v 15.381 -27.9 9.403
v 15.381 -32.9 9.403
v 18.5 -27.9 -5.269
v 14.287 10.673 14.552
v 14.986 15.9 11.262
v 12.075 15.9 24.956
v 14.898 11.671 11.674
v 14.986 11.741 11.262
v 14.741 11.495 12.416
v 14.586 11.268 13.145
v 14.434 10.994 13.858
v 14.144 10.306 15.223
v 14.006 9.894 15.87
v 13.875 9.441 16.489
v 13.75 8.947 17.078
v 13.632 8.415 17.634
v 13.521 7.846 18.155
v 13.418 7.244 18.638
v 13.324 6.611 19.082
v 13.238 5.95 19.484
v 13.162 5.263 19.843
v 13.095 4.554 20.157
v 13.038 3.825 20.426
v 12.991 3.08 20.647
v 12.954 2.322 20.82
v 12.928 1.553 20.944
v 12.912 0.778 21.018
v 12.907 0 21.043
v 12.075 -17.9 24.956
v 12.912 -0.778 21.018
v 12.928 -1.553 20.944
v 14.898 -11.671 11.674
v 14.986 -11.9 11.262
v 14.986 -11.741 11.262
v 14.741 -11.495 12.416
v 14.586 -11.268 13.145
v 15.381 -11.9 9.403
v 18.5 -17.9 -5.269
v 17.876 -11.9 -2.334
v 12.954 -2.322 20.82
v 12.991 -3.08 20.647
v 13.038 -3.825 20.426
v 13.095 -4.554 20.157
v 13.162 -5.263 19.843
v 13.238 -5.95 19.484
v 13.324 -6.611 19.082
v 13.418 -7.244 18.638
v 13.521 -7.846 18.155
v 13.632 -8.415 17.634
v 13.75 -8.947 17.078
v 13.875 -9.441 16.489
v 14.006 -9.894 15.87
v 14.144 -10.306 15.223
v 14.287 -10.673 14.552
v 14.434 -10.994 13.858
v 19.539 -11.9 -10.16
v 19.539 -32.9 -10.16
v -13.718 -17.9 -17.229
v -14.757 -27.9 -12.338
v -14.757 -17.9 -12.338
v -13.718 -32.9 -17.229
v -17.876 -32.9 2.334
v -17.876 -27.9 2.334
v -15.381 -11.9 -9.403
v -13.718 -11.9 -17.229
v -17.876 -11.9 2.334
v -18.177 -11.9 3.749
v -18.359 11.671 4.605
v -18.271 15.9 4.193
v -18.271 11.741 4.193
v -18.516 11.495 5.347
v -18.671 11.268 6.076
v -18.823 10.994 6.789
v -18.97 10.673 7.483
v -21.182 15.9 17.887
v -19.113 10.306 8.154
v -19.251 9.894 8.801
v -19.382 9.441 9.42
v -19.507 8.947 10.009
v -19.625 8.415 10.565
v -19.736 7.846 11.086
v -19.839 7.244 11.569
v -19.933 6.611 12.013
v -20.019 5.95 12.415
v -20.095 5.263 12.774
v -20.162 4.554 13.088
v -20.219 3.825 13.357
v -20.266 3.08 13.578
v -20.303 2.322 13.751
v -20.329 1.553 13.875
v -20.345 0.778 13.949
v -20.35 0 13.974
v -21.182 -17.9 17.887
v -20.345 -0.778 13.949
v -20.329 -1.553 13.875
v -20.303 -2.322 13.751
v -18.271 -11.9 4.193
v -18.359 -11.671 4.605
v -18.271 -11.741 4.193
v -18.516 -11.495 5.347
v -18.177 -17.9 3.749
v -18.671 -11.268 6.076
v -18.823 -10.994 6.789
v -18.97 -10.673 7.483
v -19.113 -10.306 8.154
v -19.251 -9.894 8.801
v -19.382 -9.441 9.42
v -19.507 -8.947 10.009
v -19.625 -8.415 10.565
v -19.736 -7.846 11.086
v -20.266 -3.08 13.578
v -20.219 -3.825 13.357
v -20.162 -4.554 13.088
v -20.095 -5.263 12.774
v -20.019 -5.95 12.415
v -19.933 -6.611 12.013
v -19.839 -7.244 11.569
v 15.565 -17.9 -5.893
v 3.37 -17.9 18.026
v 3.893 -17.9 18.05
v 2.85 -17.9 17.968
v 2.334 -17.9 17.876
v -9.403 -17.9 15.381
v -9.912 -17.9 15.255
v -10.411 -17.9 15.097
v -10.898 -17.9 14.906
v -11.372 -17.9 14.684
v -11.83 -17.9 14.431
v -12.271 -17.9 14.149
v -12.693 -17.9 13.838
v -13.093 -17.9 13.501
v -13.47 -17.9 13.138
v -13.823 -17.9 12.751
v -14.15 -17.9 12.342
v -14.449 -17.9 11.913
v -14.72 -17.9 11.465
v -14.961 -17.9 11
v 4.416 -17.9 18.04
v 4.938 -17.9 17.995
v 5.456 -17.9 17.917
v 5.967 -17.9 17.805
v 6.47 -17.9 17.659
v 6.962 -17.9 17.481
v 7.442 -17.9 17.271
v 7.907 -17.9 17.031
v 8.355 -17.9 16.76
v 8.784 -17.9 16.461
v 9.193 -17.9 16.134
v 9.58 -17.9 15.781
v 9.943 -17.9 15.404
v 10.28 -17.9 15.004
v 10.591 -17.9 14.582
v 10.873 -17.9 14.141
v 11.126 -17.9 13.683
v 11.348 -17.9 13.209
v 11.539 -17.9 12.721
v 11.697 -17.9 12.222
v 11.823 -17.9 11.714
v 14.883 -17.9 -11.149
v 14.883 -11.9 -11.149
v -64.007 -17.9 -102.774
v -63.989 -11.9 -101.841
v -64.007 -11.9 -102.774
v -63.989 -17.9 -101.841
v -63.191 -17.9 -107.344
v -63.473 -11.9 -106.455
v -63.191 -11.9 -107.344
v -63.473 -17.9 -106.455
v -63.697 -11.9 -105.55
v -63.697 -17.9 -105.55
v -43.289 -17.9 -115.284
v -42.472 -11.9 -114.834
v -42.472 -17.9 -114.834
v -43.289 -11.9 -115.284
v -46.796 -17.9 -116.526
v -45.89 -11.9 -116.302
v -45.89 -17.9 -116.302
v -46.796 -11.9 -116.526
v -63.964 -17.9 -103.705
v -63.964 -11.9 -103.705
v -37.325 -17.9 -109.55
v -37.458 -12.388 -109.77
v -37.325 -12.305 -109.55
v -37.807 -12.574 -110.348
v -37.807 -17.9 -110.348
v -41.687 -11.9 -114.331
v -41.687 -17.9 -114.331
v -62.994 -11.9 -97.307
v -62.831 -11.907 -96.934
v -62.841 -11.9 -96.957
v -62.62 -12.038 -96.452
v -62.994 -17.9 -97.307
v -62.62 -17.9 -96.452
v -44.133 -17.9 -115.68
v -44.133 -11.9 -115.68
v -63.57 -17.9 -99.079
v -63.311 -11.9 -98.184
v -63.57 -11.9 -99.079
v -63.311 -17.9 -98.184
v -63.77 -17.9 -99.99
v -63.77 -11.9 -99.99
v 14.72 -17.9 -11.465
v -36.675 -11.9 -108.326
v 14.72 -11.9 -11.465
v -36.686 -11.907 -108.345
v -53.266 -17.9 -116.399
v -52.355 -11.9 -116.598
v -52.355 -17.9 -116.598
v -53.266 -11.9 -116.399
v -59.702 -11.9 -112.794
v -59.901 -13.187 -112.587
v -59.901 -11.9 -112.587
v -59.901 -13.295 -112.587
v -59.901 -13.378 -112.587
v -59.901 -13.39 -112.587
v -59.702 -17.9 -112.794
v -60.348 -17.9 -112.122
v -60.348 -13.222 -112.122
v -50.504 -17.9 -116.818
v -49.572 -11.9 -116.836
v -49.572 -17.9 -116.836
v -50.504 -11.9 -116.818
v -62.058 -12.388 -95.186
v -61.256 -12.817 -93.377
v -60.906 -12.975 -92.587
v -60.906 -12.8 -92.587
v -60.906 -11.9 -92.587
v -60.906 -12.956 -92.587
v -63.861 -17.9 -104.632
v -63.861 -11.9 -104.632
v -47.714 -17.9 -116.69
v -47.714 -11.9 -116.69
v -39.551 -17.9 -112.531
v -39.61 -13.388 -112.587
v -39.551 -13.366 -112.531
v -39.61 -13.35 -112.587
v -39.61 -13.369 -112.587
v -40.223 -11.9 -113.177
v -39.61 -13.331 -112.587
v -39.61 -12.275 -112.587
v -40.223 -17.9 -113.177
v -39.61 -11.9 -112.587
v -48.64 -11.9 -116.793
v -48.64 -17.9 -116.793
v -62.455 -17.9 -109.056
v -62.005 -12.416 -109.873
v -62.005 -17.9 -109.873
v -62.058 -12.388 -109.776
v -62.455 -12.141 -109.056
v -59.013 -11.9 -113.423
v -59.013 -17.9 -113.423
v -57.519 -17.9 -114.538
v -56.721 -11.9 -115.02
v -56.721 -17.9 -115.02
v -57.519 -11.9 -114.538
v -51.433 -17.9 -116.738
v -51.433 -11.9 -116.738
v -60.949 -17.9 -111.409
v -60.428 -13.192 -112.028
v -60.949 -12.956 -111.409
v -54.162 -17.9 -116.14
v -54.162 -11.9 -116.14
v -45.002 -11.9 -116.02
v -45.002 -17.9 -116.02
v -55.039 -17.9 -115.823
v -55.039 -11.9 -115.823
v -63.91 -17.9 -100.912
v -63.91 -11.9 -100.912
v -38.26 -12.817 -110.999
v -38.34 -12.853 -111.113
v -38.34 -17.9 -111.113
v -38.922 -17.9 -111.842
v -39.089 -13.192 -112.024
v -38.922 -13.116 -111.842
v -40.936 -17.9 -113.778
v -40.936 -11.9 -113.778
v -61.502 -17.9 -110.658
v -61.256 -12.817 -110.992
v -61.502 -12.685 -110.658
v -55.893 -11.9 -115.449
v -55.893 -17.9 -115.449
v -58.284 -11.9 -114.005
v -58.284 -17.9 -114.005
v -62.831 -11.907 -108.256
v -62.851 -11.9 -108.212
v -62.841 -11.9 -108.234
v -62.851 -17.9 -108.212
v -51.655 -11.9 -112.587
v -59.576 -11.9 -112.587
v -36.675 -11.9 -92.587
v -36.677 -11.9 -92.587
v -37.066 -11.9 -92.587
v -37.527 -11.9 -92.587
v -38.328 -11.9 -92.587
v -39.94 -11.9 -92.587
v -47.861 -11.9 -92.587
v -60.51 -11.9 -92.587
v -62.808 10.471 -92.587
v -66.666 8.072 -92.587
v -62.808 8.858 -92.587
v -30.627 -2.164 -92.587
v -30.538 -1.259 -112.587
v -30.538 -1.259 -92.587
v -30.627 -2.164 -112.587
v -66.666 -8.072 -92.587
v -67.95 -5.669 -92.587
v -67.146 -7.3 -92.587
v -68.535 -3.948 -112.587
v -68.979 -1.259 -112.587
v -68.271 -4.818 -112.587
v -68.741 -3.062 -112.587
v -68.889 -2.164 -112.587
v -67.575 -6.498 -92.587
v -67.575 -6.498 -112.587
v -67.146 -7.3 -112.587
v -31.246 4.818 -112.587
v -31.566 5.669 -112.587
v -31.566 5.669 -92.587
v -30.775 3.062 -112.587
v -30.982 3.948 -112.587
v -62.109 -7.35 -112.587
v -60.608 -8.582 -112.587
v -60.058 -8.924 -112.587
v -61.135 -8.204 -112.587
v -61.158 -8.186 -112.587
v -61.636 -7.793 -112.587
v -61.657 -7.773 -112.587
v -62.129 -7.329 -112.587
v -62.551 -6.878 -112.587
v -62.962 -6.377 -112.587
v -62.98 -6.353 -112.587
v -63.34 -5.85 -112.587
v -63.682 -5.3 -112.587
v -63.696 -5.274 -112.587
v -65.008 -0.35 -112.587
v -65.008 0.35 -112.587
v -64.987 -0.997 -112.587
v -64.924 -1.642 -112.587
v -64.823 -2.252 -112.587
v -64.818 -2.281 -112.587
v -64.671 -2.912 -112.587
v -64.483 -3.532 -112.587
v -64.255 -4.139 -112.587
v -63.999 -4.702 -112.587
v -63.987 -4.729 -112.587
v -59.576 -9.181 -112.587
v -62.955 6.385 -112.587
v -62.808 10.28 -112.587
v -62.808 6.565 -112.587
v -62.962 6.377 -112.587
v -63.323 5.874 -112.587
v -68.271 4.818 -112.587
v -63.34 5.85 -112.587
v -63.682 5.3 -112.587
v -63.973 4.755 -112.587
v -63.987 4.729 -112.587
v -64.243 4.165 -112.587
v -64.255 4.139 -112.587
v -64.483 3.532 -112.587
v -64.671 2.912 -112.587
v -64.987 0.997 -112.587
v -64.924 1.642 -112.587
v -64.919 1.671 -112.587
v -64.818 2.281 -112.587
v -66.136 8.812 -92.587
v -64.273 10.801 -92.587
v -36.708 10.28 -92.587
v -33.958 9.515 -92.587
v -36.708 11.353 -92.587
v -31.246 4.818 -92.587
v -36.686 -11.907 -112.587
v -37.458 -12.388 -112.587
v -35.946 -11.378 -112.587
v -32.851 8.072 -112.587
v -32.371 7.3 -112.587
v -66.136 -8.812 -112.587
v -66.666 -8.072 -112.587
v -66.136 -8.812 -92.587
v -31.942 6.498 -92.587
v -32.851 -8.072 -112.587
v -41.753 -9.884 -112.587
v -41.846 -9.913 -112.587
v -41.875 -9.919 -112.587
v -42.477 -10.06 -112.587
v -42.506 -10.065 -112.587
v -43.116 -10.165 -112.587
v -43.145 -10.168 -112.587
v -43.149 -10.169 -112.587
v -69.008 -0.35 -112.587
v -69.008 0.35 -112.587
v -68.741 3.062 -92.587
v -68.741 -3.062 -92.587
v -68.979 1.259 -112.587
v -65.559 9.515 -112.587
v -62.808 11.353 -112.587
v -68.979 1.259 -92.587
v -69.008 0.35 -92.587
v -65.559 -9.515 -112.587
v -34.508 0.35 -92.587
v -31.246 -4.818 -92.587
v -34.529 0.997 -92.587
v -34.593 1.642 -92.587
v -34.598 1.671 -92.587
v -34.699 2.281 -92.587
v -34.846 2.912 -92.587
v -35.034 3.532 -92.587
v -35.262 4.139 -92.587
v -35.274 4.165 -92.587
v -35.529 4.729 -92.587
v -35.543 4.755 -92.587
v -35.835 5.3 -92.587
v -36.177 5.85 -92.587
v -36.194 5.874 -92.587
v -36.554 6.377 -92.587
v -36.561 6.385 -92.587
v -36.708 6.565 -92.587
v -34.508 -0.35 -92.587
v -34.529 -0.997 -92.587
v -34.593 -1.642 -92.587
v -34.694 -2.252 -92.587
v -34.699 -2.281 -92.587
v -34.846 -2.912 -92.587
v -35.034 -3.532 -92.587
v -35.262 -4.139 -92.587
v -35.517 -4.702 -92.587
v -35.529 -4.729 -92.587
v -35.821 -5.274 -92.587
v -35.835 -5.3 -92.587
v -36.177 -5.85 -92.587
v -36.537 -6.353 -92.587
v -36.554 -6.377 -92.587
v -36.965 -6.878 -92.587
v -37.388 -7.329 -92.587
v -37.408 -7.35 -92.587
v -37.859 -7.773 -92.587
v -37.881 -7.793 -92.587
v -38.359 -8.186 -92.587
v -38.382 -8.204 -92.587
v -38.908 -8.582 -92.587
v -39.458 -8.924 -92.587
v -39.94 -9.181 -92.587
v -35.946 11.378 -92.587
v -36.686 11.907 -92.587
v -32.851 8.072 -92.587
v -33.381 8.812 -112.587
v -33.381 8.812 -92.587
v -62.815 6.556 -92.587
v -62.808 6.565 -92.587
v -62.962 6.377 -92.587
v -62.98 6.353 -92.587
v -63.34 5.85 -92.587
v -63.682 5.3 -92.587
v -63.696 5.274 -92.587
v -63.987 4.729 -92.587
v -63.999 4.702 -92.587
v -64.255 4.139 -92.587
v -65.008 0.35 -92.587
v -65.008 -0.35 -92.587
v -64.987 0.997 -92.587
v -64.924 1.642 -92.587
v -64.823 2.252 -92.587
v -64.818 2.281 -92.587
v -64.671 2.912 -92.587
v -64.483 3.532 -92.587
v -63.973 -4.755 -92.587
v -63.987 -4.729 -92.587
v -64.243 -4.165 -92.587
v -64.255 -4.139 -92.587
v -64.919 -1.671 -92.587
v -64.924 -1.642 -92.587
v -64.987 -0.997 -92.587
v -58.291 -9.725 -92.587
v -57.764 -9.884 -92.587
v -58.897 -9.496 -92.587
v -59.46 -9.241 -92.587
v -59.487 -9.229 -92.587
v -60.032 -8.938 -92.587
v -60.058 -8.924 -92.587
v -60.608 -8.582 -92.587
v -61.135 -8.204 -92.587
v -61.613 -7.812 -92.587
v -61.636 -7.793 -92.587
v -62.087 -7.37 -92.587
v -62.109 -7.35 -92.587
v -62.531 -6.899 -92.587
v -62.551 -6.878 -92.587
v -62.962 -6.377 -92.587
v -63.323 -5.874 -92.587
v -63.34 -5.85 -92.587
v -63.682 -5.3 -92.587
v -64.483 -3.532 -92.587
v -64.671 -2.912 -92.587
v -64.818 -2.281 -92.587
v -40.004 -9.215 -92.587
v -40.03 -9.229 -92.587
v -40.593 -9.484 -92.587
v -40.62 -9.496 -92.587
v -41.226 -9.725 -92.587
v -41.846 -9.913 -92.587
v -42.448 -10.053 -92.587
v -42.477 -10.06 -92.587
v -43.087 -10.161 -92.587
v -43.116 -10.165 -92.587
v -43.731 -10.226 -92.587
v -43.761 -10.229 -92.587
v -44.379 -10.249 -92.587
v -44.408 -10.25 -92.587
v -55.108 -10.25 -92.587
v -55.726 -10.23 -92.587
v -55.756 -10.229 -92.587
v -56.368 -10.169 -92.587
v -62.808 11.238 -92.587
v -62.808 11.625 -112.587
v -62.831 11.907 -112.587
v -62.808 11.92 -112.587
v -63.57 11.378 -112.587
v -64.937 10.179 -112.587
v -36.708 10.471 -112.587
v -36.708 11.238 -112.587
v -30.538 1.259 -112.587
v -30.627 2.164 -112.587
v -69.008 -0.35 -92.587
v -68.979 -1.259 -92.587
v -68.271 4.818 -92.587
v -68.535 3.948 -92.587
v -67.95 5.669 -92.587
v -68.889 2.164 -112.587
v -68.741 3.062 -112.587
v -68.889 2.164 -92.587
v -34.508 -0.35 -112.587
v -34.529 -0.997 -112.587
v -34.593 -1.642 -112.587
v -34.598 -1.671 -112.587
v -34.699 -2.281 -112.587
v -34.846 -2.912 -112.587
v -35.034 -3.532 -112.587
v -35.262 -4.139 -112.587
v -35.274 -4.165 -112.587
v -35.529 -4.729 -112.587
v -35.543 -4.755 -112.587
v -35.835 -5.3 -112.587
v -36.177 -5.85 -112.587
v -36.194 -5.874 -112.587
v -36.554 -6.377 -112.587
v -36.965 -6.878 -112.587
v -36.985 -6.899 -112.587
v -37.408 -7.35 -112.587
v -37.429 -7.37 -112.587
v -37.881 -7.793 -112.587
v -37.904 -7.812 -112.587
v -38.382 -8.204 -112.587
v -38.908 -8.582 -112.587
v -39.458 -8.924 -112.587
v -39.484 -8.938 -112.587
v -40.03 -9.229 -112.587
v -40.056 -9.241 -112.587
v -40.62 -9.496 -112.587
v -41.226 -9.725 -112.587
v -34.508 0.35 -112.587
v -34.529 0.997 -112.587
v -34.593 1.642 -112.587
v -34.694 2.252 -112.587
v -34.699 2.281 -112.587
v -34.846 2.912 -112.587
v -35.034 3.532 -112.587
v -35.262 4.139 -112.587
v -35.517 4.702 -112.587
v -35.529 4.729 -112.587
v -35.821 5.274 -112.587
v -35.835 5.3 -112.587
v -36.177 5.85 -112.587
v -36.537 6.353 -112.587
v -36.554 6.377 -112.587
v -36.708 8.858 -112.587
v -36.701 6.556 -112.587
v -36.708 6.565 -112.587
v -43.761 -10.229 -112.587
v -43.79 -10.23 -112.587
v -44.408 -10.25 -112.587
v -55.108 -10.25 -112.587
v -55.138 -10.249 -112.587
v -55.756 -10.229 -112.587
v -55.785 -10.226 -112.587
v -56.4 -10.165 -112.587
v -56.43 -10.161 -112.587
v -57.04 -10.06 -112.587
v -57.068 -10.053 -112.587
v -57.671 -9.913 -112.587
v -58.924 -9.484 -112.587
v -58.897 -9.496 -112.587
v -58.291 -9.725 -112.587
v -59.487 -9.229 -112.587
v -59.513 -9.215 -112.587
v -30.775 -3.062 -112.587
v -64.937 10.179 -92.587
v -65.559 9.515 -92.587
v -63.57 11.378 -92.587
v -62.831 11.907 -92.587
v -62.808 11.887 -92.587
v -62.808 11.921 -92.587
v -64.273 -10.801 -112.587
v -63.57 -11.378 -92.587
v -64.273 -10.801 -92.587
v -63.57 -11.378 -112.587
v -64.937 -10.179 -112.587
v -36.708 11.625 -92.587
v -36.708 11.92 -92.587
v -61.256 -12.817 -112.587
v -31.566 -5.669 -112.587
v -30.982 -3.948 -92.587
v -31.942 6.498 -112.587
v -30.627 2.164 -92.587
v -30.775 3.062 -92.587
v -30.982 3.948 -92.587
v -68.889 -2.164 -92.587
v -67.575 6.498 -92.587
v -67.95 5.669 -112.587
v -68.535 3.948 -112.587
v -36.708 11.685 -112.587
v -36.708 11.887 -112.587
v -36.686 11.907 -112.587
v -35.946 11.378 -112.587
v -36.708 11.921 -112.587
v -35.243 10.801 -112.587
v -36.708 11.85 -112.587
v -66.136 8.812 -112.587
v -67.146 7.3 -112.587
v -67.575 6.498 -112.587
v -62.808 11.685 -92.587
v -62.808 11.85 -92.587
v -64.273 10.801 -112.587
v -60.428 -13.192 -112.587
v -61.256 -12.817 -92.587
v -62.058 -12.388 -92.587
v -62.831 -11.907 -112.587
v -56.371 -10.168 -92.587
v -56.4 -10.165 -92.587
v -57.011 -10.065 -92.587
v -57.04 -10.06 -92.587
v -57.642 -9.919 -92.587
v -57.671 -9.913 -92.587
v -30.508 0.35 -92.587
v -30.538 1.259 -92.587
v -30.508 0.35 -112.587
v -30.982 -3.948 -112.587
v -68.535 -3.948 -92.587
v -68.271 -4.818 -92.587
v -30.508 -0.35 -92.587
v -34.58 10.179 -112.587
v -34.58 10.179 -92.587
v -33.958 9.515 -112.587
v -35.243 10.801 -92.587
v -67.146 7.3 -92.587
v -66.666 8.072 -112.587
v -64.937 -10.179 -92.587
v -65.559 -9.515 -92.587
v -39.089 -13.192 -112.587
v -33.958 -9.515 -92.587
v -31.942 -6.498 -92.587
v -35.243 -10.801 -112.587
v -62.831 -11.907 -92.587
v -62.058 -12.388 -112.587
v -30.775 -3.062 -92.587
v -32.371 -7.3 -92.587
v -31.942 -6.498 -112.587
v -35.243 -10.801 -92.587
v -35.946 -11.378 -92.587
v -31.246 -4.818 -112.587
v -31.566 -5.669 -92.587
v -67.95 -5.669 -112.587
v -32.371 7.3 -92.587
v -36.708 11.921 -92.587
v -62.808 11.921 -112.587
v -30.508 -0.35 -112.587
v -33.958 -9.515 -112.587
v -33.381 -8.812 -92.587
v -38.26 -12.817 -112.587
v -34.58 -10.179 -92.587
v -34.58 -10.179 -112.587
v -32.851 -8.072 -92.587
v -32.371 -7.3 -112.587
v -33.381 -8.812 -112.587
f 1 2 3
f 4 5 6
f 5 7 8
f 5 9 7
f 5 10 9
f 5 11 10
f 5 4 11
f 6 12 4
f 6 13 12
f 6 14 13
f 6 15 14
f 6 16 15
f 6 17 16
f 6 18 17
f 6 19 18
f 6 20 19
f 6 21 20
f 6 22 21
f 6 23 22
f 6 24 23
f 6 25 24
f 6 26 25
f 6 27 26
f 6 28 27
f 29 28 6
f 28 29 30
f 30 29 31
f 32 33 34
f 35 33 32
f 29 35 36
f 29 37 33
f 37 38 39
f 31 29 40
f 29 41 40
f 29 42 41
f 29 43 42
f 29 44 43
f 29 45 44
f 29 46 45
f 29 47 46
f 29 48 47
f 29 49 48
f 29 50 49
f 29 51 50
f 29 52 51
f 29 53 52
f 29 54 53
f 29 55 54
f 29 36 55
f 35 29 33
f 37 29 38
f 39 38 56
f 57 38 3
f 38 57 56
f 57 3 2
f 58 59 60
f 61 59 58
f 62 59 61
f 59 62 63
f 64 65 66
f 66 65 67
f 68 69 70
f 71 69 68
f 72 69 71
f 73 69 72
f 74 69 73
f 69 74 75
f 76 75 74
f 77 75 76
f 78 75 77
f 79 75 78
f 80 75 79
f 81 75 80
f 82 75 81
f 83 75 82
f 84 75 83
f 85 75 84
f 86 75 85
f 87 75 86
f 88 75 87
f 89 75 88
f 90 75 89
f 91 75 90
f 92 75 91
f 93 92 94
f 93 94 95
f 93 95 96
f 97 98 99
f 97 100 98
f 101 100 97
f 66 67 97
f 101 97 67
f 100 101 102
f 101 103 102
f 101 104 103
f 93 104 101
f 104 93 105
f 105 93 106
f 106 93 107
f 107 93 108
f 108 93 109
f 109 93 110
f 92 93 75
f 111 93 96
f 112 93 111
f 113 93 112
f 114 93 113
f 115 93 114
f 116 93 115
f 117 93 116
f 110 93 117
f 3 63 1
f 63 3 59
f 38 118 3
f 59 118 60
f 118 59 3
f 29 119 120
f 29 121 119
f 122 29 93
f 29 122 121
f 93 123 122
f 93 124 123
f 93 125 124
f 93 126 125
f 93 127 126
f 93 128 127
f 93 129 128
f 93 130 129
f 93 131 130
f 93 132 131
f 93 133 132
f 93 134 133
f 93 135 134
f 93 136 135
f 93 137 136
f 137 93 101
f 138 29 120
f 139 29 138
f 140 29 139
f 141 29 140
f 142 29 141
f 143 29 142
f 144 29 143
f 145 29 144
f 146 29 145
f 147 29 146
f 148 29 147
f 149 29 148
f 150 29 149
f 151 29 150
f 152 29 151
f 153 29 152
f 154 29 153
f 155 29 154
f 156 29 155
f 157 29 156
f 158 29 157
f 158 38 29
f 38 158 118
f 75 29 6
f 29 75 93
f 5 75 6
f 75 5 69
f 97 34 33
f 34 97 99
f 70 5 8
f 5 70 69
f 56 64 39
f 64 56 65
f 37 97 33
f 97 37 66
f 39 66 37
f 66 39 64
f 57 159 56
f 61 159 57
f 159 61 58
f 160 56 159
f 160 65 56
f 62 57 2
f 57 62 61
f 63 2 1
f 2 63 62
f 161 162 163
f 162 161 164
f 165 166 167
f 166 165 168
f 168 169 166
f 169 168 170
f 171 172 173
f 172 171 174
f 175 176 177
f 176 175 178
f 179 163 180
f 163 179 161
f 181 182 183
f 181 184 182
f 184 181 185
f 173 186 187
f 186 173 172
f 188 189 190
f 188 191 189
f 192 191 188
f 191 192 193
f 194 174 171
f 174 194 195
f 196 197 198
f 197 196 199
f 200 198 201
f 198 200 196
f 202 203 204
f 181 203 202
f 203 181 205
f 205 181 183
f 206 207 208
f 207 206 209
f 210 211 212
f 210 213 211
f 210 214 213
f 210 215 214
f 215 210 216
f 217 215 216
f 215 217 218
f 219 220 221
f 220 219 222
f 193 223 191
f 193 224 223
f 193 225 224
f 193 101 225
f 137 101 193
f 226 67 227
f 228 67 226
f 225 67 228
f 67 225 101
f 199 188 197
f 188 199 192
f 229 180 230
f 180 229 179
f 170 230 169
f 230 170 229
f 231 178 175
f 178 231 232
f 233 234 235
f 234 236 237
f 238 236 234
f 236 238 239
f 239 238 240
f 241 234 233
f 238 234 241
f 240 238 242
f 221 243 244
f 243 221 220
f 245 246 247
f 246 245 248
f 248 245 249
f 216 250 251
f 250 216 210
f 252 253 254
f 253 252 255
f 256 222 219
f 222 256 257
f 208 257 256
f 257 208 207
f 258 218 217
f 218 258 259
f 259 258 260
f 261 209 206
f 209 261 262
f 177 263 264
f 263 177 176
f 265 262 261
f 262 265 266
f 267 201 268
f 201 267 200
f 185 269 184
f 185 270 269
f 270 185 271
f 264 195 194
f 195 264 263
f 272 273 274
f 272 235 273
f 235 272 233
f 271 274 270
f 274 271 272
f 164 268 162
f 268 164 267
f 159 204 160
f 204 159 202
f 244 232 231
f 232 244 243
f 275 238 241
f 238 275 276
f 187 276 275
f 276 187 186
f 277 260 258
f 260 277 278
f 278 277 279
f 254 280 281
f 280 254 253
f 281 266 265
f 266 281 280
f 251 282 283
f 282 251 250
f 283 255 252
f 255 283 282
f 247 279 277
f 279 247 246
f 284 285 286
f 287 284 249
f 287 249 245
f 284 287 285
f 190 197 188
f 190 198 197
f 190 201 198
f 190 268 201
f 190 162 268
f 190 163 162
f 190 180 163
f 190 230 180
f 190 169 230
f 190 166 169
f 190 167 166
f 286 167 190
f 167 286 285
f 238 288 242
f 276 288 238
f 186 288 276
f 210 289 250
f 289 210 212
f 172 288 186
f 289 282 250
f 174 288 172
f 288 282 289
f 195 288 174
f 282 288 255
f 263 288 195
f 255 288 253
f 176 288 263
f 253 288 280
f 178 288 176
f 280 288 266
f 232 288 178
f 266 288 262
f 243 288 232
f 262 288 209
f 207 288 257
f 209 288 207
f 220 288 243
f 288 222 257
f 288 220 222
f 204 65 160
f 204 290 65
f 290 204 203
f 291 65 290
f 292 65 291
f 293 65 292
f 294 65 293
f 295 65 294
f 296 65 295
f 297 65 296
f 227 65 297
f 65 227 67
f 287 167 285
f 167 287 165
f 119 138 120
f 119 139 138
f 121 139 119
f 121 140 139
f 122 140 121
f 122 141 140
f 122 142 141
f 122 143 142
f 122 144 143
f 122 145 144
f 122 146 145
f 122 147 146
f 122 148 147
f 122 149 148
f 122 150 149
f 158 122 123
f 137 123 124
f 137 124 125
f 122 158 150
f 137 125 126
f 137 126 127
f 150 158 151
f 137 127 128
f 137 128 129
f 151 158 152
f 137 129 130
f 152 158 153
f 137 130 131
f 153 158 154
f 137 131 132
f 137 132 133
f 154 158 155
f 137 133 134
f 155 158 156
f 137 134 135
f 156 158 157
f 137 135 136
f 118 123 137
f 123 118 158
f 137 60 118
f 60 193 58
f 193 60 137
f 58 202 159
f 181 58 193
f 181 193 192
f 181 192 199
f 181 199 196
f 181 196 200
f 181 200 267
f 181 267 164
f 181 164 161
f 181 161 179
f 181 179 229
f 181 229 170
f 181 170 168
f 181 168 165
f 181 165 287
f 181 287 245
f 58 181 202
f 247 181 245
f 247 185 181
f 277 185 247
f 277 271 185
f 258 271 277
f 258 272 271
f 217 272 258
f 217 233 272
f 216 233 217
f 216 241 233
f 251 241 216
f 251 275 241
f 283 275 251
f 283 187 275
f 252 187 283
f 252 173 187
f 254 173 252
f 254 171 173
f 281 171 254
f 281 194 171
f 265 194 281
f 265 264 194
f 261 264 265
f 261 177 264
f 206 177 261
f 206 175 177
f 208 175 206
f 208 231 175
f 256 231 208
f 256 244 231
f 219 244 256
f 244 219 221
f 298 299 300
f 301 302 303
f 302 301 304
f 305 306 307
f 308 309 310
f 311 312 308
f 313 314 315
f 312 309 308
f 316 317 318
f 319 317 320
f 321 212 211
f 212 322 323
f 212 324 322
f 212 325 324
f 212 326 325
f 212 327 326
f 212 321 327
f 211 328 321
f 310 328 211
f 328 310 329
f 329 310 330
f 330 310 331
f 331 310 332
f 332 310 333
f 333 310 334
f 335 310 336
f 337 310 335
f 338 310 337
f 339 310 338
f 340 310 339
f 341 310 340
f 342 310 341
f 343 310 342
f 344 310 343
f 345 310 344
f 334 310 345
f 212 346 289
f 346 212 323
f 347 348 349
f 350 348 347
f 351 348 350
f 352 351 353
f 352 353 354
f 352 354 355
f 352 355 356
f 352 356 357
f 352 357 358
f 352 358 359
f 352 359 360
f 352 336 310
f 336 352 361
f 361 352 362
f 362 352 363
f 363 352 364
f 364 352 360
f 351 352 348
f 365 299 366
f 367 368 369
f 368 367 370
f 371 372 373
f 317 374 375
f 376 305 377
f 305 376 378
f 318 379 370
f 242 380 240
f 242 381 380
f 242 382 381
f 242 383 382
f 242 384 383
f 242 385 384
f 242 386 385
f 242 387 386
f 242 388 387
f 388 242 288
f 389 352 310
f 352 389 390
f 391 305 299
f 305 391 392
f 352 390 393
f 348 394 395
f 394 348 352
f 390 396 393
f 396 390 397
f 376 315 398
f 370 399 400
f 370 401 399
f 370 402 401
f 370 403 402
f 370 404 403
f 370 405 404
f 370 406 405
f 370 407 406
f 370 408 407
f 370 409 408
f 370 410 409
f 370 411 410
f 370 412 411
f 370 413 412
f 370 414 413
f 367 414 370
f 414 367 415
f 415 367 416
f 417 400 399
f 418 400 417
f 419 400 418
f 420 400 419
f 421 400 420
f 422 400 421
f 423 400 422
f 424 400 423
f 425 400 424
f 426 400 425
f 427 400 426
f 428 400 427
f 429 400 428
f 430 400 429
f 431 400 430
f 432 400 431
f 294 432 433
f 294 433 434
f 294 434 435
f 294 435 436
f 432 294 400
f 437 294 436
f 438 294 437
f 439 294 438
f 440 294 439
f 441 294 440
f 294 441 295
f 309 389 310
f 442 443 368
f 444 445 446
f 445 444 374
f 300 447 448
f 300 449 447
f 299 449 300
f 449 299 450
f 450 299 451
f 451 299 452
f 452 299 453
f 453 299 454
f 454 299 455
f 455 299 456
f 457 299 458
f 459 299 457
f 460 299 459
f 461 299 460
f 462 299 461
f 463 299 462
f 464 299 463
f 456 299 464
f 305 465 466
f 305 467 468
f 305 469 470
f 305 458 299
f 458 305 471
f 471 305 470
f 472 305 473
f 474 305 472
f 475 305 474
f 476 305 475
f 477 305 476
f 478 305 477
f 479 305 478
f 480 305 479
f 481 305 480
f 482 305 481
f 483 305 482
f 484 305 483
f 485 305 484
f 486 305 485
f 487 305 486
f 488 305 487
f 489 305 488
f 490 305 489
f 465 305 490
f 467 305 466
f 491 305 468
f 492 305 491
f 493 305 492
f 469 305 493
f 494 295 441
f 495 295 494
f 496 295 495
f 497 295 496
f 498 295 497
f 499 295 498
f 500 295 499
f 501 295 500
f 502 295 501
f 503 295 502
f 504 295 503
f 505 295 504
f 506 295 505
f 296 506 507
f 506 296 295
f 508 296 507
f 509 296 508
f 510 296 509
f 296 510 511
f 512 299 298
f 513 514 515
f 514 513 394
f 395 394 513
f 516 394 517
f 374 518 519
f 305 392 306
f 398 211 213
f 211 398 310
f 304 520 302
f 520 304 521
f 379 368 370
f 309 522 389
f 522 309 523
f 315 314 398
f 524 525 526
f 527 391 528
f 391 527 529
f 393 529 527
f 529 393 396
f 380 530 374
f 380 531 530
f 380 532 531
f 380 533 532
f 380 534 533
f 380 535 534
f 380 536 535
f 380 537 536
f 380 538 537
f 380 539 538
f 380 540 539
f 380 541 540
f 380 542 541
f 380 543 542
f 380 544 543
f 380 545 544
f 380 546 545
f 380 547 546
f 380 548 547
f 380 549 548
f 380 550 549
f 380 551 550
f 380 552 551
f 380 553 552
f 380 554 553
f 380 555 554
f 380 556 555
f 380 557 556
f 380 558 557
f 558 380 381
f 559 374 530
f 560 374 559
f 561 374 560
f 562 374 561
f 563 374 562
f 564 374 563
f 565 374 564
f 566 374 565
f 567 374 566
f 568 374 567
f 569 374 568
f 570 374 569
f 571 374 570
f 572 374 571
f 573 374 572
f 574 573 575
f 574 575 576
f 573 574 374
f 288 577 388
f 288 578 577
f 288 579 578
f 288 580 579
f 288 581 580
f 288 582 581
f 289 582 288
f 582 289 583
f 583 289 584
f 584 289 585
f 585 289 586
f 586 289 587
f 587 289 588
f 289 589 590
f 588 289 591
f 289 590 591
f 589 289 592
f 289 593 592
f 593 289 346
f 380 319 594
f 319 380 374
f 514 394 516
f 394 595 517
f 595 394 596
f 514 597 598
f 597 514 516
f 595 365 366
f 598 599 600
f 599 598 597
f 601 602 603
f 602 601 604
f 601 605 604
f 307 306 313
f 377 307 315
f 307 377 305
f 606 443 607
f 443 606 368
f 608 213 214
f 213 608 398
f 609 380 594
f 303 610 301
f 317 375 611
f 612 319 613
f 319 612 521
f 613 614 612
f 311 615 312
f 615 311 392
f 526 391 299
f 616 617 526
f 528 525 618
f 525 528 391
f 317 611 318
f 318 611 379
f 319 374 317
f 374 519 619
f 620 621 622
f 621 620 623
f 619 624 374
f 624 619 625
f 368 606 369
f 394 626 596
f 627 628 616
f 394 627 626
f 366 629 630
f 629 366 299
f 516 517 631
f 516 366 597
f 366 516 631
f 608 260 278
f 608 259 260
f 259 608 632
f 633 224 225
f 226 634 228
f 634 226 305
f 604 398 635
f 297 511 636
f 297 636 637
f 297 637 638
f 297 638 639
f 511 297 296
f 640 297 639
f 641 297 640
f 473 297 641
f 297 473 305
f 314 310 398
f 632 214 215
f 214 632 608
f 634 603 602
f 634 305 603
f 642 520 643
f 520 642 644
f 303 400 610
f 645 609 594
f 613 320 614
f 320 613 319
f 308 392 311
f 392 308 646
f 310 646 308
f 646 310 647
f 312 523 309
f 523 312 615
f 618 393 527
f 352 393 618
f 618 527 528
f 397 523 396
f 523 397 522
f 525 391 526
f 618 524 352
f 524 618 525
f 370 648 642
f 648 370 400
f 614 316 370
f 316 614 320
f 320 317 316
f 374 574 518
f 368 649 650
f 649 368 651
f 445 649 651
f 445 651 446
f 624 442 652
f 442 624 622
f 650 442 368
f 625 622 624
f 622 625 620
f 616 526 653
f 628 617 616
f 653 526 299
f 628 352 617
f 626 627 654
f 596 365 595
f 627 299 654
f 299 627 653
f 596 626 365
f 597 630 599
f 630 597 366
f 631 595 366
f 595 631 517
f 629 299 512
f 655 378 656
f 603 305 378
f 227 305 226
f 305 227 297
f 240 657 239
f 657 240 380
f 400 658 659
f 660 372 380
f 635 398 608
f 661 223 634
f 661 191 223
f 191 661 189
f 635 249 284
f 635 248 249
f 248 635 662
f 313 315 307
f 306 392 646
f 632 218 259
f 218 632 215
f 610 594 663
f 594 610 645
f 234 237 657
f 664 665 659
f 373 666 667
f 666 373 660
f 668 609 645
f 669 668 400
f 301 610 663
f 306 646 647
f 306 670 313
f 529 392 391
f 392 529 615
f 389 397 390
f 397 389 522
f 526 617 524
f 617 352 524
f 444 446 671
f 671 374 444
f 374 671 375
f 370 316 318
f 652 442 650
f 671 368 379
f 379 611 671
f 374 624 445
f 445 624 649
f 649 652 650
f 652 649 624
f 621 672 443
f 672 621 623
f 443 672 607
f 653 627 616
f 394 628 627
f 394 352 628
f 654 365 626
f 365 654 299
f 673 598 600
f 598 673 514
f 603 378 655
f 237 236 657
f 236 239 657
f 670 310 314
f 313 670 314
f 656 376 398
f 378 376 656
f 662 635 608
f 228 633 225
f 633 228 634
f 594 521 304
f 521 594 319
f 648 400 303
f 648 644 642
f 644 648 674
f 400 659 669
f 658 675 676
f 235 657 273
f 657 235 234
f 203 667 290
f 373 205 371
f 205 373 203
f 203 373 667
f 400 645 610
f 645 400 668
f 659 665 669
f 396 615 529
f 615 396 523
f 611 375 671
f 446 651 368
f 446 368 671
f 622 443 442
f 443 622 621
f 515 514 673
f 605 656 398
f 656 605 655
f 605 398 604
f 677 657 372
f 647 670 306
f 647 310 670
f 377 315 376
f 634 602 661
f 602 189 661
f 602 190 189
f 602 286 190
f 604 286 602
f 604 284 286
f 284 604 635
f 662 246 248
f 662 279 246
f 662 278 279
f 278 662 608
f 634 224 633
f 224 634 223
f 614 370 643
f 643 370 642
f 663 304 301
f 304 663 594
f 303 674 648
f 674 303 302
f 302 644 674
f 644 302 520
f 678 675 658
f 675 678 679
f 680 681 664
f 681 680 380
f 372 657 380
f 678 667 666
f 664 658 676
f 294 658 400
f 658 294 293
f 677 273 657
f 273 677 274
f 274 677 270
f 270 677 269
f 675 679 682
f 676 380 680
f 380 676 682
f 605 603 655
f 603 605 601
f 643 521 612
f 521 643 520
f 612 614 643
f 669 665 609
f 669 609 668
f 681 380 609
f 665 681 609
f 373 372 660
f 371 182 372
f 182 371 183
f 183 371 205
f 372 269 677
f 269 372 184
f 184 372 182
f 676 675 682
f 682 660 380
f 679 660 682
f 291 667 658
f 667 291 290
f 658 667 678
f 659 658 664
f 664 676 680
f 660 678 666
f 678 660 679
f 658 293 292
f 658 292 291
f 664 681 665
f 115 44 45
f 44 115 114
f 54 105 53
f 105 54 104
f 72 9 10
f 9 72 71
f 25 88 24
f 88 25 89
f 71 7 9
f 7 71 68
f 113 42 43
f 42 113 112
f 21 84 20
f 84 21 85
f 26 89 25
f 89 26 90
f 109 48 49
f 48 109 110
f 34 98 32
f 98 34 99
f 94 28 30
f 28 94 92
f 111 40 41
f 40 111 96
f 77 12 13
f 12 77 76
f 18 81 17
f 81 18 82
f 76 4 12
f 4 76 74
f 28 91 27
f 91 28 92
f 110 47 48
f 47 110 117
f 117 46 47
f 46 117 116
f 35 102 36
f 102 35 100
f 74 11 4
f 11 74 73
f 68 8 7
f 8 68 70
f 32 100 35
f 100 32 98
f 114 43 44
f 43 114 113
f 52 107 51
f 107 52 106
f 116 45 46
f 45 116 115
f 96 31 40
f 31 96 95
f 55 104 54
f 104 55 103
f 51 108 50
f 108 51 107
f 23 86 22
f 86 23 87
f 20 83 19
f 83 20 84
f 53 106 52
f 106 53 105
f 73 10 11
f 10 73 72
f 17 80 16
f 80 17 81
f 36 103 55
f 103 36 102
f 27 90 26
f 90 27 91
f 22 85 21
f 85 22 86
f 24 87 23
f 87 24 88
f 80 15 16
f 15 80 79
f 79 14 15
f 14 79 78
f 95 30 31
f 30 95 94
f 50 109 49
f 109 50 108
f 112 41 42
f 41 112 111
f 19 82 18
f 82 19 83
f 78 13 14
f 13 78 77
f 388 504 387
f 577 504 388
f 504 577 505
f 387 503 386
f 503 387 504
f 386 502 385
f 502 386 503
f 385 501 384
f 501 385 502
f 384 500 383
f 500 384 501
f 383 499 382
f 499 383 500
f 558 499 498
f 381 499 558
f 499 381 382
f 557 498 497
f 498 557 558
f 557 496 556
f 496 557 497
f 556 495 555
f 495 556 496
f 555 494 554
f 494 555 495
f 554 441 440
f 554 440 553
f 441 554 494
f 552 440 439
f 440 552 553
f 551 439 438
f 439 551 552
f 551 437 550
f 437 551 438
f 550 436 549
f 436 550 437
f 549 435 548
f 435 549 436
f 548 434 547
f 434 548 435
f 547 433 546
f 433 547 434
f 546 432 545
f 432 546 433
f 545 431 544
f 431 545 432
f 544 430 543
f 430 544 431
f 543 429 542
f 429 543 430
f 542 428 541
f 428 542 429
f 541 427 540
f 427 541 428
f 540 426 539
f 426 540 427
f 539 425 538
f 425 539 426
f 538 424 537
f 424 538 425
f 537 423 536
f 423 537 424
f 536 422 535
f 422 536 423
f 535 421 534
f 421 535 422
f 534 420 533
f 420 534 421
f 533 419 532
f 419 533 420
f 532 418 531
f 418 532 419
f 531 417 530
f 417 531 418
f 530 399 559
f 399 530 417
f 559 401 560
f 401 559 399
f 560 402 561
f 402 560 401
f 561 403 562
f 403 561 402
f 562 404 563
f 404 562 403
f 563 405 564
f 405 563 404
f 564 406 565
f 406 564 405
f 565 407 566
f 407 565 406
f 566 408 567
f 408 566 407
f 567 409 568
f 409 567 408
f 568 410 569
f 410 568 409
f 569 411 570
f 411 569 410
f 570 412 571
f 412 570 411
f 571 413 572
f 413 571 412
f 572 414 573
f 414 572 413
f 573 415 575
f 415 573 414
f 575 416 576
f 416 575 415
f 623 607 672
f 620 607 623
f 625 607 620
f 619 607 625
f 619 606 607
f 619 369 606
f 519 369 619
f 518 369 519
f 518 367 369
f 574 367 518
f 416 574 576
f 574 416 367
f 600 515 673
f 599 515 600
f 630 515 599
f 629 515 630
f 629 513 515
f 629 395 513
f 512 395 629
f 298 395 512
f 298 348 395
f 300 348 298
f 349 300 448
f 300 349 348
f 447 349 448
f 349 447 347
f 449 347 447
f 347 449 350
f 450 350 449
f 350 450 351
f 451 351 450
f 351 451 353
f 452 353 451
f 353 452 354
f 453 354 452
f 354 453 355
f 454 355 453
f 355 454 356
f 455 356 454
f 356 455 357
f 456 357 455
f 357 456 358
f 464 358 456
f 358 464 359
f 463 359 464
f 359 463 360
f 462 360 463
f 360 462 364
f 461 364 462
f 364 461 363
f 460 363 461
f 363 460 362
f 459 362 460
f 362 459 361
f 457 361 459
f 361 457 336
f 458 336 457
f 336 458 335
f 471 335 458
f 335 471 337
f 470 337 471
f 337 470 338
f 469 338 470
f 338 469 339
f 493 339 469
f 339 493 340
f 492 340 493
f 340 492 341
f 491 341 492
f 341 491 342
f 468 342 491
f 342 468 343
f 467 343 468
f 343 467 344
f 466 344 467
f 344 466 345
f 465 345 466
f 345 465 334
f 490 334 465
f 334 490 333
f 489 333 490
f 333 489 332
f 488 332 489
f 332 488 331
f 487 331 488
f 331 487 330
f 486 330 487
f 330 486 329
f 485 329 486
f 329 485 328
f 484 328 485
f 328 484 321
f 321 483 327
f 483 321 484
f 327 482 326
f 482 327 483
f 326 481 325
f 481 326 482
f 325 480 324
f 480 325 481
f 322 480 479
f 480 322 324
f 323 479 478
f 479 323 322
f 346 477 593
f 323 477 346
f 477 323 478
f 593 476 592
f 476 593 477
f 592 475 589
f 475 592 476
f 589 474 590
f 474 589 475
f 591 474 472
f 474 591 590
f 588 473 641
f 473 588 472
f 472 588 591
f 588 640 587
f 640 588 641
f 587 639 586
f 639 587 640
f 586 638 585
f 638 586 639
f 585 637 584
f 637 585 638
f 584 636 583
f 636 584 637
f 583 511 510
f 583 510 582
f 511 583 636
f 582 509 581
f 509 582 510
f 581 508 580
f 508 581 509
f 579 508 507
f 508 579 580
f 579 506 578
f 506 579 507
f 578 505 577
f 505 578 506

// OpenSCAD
// =====================================================================
//  Chicco Corso — corner caddy. One piece. Snaps onto the side arm,
//  slides down, and locks under the top arc.
//
//  World frame, standing behind the stroller:
//      +X   along the top arc, toward the middle of the handle
//      +Y   up
//      +Z   inboard, toward the seat. The cup hangs this way.
//  The handle's U lies in the XY plane. The arc runs along X; the side
//  arm hangs from the corner, leaning out by arm_tilt.
//
//  The hook sits at the ORIGIN on the arc. The claw sits at
//  (-nom_run, -nom_drop) on the arm. The model is drawn SEATED.
//
//  HOW IT WORKS
//    On:  hold it high so the hook clears the arc, snap the claw onto
//         the side arm, slide down until the hook seats on the arc.
//    Off: slide up until the hook lifts clear, then unsnap.
//
//    The hook is an inverted U resting on top of the arc. It carries
//    the weight and sets the height — sliding down stops when it
//    bottoms out, which is what keeps the caddy from slipping down the
//    arm. The claw is a light snap; because the arm is tilted, the claw
//    slides freely ALONG it, and that is where the travel comes from.
//
//  WHY IT LOCKS
//    Each grip blocks the direction the other releases in.
//      - The hook straddles the arc front-to-back, so front-to-back is
//        what it constrains: 0.4 mm of play.
//      - The claw's mouth points REARWARD, into that constraint. It
//        cannot open while the hook is seated.
//      - The claw wraps the arm side-to-side, stopping the caddy
//        sliding along the arc.
//      - Down is stopped by the hook resting on the bar.
//    Up is the only motion left, and that is the intended release.
//
//    Point the mouth any other way and this falls apart — outboard, and
//    the whole caddy pulls straight off sideways with the hook still
//    seated. The mouth direction IS the lock.
//
//    Neither snap carries load, so neither has to be tight.
//
//  ANGLES
//    One piece means the corner geometry is baked in, so nom_run,
//    nom_drop and arm_tilt have to be right. Two things make that
//    easier than it sounds:
//      - The claw slides along the arm, so error ALONG the arm just
//        parks the caddy slightly higher or lower. Self-correcting.
//        Only the PERPENDICULAR offset matters.
//      - A short claw tolerates angle error. Misalignment across the
//        bore is about claw_len * sin(error)/2, so at claw_len = 20 a
//        5-degree error is 0.9 mm, which the clearance absorbs.
//
//  PRINTING
//    Exported standing on the arm axis. The claw is then a true
//    vertical prism, the strut and throat are vertical walls, and the
//    throat opens upward. The only overhang is the hook's top plate,
//    which bridges the bar channel — a routine 24 mm bridge.
// =====================================================================

part = "caddy";  // [caddy, cupholder, testfit, assembly, all]

$fn = 96;

// --- the two bars ----------------------------------------------------
// MEASURED on a Corso, 2026-08. One continuous 29 x 19 mm oval tube:
// bare on the side arm, wrapped in ~2-3 mm of rubber on the top arc
// (35 - 29 = 3 mm per side, 23 - 19 = 2 mm per side).
//
// The bend happens IN the handle plane, so the 19 mm axis stays
// front-to-back the whole way round, while the 29 mm axis rotates from
// vertical on the arc to side-to-side on the arm. That is why arc_h and
// arm_w are the same number wearing different hats.

arc_w    = 23;   // top arc, over the rubber: front to back
arc_h    = 35;   // top arc, over the rubber: top to bottom
arc_r    = 11.5; // stadium ends — half the short axis

arm_w    = 29;   // side arm, bare metal: across the handle plane
arm_h    = 19;   // side arm, bare metal: front to back
arm_r    = 9.5;  // stadium ends — half the short axis

fit      = 0.4;  // clearance to the bars
arm_slop = 0.35; // extra room in the claw, to absorb angle error
wall     = 4;

// --- corner geometry --- *** STILL NOMINAL — MEASURE THESE *** -------
// From the spot on the arc where the hook goes, to the spot on the arm
// where the claw goes. Only the component perpendicular to the arm
// really matters; see ANGLES above.

nom_run   = 70;  // horizontal, hook to claw
nom_drop  = 90;  // vertical,   hook to claw
arm_tilt  = 12;  // degrees the arm leans out from vertical

// --- hook and claw ---------------------------------------------------

hook_len    = 34;   // along the arc
hook_engage = 10;   // how far the legs reach down past the arc's top
claw_len    = 20;   // along the arm — short, for angle tolerance
claw_frac   = 0.90; // mouth width as a fraction of arm_w. The click.
strut_t     = 6;

// --- attachment interface -------------------------------------------

mnt_y      = -14;
mnt_t      = 5;
mnt_reach  = 15;
mnt_rise   = 15;
tongue_gap = 0.35;
tongue_len = 26;
crown_t    = 6;
spine_t    = 6;
spine_gap  = 0.6;
cheek_t    = 3;
cheek_gap  = 0.4;
head_up    = 8;

// --- sample cup holder ----------------------------------------------

cup_id     = 80;
ring_wall  = 3;
ring_h     = 45;
ring_top   = -34;
base_t     = 3;
drain_r    = 9;

// =====================================================================
//  Derived
// =====================================================================

arc_top   = arc_h / 2 + fit;
hook_bot  = arc_top - hook_engage;
hook_out  = arc_w / 2 + fit + wall;

claw_bore = arm_w + 2 * (fit + arm_slop);   // across the handle plane
claw_deep = arm_h + 2 * (fit + arm_slop);   // front to back
claw_out  = claw_deep / 2 + wall;
claw_mouth = arm_w * claw_frac;

// The strut runs inboard of BOTH bars, so it crosses the corner without
// fouling either.
strut_z0  = arc_w / 2 + fit;
strut_z1  = strut_z0 + strut_t;

mnt_z0     = strut_z1;
throat_y   = mnt_y + mnt_t;
throat_top = throat_y + mnt_rise;
tip_inner  = mnt_z0 + mnt_reach - mnt_t;
tip_outer  = mnt_z0 + mnt_reach;
throat_w   = mnt_reach - mnt_t;

tongue_z0  = mnt_z0 + tongue_gap;
tongue_t   = throat_w - 2 * tongue_gap;
tongue_y0  = throat_y + tongue_gap;
tongue_top = throat_top + head_up;
spine_z    = tip_outer + spine_gap;
cheek_x    = hook_len / 2 + cheek_gap + cheek_t / 2;

cup_or     = cup_id / 2 + ring_wall;
cup_cz     = spine_z + spine_t + cup_or - 3;

// =====================================================================
//  Sanity. An undefined name silently becomes undef in OpenSCAD and
//  linear_extrude(undef) quietly builds something enormous instead of
//  failing, so these guard the values the geometry depends on.
// =====================================================================

assert(is_num(strut_z0) && is_num(claw_out) && is_num(hook_out),
       "core constants must all be numbers");
assert(strut_z0 >= arc_w / 2 + fit,  "strut would foul the top arc");
assert(strut_z0 > arm_h / 2,         "strut would foul the side arm");
assert(strut_z1 > claw_out - wall,   "strut misses the claw body");
assert(hook_bot < arc_top,           "hook legs grip nothing");
assert(claw_mouth < arm_w,           "claw mouth is wider than the arm");
assert(tongue_t > 0 && throat_w > 0, "throat is degenerate");

// =====================================================================
//  Helpers
// =====================================================================

module rrect(w, h, r) {
    rr = min(r, w / 2, h / 2);
    hull()
        for (sx = [-1, 1], sy = [-1, 1])
            translate([sx * (w / 2 - rr), sy * (h / 2 - rr)])
                circle(r = rr);
}

module box(x0, y0, x1, y1) {
    translate([min(x0, x1), min(y0, y1)])
        square([abs(x1 - x0), abs(y1 - y0)]);
}

// Everything belonging to the claw is drawn about the origin and moved
// onto the arm by this.
module at_arm() {
    translate([-nom_run, -nom_drop, 0]) rotate([0, 0, -arm_tilt])
        children();
}

// --- the handle, for fit checks. Not printed. ------------------------

module arc_bar(len = 300) {
    rotate([0, 90, 0]) linear_extrude(len, center = true)
        rrect(arc_w, arc_h, arc_r);
}

module arm_bar(len = 240, up = 40) {
    at_arm() translate([0, up, 0]) rotate([90, 0, 0])
        linear_extrude(len) rrect(arm_w, arm_h, arm_r);
}

// =====================================================================
//  The caddy — one piece
// =====================================================================

// Hook and throat, drawn in the arc's cross-section: local x -> world Z,
// local y -> world Y, extruded along the arc.
module hook_profile() {
    box(-hook_out, hook_bot, hook_out, arc_top + wall);      // inverted U
    // Web tying the throat back to the hook. It starts at strut_z0, not
    // inside it: any material within the arc's envelope is hidden by
    // the bar cut while seated, then fouls the bar on the way off.
    box(strut_z0, mnt_y, mnt_z0, arc_top + wall);
    box(mnt_z0 - 1, mnt_y, tip_outer, throat_y);             // throat arm
    box(tip_inner, throat_y - 1, tip_outer, throat_top);     // upturned tip
}

module hook_and_throat() {
    rotate([0, -90, 0]) linear_extrude(hook_len, center = true)
        hook_profile();
}

// A flat plate lying inboard of both bars, crossing the corner.
module strut_2d() {
    hull() {
        rrect(28, 34, 8);
        translate([-nom_run, -nom_drop]) circle(r = claw_out);
    }
}

module strut() {
    translate([0, 0, strut_z0]) linear_extrude(strut_t) strut_2d();
}

// Claw, drawn in the arm's cross-section: local x -> world X (across the
// handle plane), local y -> world -Z (front to back).
module claw_profile() {
    rrect(claw_bore + 2 * wall, claw_deep + 2 * wall, arm_r + fit + wall);
}

module claw_cut_profile() {
    rrect(claw_bore, claw_deep, arm_r + fit);
    // Mouth opens REARWARD. See WHY IT LOCKS: that is the one direction
    // the hook constrains, so it is the only direction it may face.
    box(-claw_mouth / 2, 0, claw_mouth / 2, claw_deep);
}

module claw() {
    at_arm() rotate([-90, 0, 0])
        linear_extrude(claw_len, center = true) claw_profile();
}

module claw_cut(over = 2) {
    at_arm() rotate([-90, 0, 0])
        linear_extrude(claw_len + over, center = true) claw_cut_profile();
}

module caddy() {
    difference() {
        union() { hook_and_throat(); strut(); claw(); }
        rotate([0, -90, 0]) linear_extrude(hook_len + 2, center = true)
            rrect(arc_w + 2 * fit, arc_h + 2 * fit, arc_r + fit);
        claw_cut();
    }
}

// =====================================================================
//  Attachment interface
//
//  Call hook_mount() and put your geometry outboard of
//  spine_z + spine_t.
// =====================================================================

module tongue_profile() {
    difference() {
        box(tongue_z0, tongue_y0, tongue_z0 + tongue_t, tongue_top);
        for (s = [0, 1])
            translate([tongue_z0 + s * tongue_t, tongue_y0])
                rotate([0, 0, 45]) square(3.2, center = true);
    }
}

module yoke_profile(spine_bottom) {
    box(tongue_z0, tongue_top - crown_t, spine_z + spine_t, tongue_top);
    box(spine_z, spine_bottom, spine_z + spine_t, tongue_top);
}

module cheek_profile() { box(mnt_z0 + 0.4, mnt_y, spine_z, tongue_top); }

module hook_mount(spine_bottom = ring_top - ring_h) {
    rotate([0, -90, 0]) {
        linear_extrude(tongue_len, center = true) tongue_profile();
        linear_extrude(2 * cheek_x + cheek_t, center = true)
            yoke_profile(spine_bottom);
        for (s = [-1, 1])
            translate([0, 0, s * cheek_x])
                linear_extrude(cheek_t, center = true) cheek_profile();
    }
}

// =====================================================================
//  Parts
// =====================================================================

module testfit() {
    hook_mount(spine_bottom = mnt_y - 16);
    difference() {
        translate([0, mnt_y - 6, spine_z + spine_t - 2]) cylinder(h = 12, r = 9);
        translate([0, mnt_y - 6, spine_z + spine_t - 3]) cylinder(h = 14, r = 4.5);
    }
}

module cup_ring() {
    translate([0, ring_top - ring_h, cup_cz]) rotate([-90, 0, 0])
        difference() {
            cylinder(h = ring_h, r = cup_or);
            translate([0, 0, base_t]) cylinder(h = ring_h, r = cup_id / 2);
            translate([0, 0, -1]) cylinder(h = base_t + 2, r = drain_r);
        }
}

module cupholder() { hook_mount(); cup_ring(); }

// Fit check only. `lift` slides the caddy up the arm, the way it comes
// off. Not for printing.
module assembly(lift = 0) {
    translate([lift * sin(arm_tilt), lift * cos(arm_tilt), 0]) {
        color("SteelBlue") caddy();
        color("Goldenrod") cupholder();
    }
    %arc_bar();
    %arm_bar();
}

// Stand it on the arm axis: the claw becomes a true vertical prism and
// the throat opens upward.
module lay() { rotate([90, 0, 0]) rotate([0, 0, arm_tilt]) children(); }

echo(str("claw springs ", arm_w - claw_mouth, " mm to click on"));
echo(str("hook allows ", 2 * fit, " mm of front-to-back play when seated"));
echo(str("angle slack ", claw_len * sin(5) / 2,
         " mm across the bore at 5 degrees of error"));

if      (part == "caddy")     lay() caddy();
else if (part == "cupholder") cupholder();
else if (part == "testfit")   testfit();
else if (part == "assembly")  assembly();
else if (part == "raised")    assembly(lift = 26);
else if (part == "all")       { caddy(); cupholder(); }
